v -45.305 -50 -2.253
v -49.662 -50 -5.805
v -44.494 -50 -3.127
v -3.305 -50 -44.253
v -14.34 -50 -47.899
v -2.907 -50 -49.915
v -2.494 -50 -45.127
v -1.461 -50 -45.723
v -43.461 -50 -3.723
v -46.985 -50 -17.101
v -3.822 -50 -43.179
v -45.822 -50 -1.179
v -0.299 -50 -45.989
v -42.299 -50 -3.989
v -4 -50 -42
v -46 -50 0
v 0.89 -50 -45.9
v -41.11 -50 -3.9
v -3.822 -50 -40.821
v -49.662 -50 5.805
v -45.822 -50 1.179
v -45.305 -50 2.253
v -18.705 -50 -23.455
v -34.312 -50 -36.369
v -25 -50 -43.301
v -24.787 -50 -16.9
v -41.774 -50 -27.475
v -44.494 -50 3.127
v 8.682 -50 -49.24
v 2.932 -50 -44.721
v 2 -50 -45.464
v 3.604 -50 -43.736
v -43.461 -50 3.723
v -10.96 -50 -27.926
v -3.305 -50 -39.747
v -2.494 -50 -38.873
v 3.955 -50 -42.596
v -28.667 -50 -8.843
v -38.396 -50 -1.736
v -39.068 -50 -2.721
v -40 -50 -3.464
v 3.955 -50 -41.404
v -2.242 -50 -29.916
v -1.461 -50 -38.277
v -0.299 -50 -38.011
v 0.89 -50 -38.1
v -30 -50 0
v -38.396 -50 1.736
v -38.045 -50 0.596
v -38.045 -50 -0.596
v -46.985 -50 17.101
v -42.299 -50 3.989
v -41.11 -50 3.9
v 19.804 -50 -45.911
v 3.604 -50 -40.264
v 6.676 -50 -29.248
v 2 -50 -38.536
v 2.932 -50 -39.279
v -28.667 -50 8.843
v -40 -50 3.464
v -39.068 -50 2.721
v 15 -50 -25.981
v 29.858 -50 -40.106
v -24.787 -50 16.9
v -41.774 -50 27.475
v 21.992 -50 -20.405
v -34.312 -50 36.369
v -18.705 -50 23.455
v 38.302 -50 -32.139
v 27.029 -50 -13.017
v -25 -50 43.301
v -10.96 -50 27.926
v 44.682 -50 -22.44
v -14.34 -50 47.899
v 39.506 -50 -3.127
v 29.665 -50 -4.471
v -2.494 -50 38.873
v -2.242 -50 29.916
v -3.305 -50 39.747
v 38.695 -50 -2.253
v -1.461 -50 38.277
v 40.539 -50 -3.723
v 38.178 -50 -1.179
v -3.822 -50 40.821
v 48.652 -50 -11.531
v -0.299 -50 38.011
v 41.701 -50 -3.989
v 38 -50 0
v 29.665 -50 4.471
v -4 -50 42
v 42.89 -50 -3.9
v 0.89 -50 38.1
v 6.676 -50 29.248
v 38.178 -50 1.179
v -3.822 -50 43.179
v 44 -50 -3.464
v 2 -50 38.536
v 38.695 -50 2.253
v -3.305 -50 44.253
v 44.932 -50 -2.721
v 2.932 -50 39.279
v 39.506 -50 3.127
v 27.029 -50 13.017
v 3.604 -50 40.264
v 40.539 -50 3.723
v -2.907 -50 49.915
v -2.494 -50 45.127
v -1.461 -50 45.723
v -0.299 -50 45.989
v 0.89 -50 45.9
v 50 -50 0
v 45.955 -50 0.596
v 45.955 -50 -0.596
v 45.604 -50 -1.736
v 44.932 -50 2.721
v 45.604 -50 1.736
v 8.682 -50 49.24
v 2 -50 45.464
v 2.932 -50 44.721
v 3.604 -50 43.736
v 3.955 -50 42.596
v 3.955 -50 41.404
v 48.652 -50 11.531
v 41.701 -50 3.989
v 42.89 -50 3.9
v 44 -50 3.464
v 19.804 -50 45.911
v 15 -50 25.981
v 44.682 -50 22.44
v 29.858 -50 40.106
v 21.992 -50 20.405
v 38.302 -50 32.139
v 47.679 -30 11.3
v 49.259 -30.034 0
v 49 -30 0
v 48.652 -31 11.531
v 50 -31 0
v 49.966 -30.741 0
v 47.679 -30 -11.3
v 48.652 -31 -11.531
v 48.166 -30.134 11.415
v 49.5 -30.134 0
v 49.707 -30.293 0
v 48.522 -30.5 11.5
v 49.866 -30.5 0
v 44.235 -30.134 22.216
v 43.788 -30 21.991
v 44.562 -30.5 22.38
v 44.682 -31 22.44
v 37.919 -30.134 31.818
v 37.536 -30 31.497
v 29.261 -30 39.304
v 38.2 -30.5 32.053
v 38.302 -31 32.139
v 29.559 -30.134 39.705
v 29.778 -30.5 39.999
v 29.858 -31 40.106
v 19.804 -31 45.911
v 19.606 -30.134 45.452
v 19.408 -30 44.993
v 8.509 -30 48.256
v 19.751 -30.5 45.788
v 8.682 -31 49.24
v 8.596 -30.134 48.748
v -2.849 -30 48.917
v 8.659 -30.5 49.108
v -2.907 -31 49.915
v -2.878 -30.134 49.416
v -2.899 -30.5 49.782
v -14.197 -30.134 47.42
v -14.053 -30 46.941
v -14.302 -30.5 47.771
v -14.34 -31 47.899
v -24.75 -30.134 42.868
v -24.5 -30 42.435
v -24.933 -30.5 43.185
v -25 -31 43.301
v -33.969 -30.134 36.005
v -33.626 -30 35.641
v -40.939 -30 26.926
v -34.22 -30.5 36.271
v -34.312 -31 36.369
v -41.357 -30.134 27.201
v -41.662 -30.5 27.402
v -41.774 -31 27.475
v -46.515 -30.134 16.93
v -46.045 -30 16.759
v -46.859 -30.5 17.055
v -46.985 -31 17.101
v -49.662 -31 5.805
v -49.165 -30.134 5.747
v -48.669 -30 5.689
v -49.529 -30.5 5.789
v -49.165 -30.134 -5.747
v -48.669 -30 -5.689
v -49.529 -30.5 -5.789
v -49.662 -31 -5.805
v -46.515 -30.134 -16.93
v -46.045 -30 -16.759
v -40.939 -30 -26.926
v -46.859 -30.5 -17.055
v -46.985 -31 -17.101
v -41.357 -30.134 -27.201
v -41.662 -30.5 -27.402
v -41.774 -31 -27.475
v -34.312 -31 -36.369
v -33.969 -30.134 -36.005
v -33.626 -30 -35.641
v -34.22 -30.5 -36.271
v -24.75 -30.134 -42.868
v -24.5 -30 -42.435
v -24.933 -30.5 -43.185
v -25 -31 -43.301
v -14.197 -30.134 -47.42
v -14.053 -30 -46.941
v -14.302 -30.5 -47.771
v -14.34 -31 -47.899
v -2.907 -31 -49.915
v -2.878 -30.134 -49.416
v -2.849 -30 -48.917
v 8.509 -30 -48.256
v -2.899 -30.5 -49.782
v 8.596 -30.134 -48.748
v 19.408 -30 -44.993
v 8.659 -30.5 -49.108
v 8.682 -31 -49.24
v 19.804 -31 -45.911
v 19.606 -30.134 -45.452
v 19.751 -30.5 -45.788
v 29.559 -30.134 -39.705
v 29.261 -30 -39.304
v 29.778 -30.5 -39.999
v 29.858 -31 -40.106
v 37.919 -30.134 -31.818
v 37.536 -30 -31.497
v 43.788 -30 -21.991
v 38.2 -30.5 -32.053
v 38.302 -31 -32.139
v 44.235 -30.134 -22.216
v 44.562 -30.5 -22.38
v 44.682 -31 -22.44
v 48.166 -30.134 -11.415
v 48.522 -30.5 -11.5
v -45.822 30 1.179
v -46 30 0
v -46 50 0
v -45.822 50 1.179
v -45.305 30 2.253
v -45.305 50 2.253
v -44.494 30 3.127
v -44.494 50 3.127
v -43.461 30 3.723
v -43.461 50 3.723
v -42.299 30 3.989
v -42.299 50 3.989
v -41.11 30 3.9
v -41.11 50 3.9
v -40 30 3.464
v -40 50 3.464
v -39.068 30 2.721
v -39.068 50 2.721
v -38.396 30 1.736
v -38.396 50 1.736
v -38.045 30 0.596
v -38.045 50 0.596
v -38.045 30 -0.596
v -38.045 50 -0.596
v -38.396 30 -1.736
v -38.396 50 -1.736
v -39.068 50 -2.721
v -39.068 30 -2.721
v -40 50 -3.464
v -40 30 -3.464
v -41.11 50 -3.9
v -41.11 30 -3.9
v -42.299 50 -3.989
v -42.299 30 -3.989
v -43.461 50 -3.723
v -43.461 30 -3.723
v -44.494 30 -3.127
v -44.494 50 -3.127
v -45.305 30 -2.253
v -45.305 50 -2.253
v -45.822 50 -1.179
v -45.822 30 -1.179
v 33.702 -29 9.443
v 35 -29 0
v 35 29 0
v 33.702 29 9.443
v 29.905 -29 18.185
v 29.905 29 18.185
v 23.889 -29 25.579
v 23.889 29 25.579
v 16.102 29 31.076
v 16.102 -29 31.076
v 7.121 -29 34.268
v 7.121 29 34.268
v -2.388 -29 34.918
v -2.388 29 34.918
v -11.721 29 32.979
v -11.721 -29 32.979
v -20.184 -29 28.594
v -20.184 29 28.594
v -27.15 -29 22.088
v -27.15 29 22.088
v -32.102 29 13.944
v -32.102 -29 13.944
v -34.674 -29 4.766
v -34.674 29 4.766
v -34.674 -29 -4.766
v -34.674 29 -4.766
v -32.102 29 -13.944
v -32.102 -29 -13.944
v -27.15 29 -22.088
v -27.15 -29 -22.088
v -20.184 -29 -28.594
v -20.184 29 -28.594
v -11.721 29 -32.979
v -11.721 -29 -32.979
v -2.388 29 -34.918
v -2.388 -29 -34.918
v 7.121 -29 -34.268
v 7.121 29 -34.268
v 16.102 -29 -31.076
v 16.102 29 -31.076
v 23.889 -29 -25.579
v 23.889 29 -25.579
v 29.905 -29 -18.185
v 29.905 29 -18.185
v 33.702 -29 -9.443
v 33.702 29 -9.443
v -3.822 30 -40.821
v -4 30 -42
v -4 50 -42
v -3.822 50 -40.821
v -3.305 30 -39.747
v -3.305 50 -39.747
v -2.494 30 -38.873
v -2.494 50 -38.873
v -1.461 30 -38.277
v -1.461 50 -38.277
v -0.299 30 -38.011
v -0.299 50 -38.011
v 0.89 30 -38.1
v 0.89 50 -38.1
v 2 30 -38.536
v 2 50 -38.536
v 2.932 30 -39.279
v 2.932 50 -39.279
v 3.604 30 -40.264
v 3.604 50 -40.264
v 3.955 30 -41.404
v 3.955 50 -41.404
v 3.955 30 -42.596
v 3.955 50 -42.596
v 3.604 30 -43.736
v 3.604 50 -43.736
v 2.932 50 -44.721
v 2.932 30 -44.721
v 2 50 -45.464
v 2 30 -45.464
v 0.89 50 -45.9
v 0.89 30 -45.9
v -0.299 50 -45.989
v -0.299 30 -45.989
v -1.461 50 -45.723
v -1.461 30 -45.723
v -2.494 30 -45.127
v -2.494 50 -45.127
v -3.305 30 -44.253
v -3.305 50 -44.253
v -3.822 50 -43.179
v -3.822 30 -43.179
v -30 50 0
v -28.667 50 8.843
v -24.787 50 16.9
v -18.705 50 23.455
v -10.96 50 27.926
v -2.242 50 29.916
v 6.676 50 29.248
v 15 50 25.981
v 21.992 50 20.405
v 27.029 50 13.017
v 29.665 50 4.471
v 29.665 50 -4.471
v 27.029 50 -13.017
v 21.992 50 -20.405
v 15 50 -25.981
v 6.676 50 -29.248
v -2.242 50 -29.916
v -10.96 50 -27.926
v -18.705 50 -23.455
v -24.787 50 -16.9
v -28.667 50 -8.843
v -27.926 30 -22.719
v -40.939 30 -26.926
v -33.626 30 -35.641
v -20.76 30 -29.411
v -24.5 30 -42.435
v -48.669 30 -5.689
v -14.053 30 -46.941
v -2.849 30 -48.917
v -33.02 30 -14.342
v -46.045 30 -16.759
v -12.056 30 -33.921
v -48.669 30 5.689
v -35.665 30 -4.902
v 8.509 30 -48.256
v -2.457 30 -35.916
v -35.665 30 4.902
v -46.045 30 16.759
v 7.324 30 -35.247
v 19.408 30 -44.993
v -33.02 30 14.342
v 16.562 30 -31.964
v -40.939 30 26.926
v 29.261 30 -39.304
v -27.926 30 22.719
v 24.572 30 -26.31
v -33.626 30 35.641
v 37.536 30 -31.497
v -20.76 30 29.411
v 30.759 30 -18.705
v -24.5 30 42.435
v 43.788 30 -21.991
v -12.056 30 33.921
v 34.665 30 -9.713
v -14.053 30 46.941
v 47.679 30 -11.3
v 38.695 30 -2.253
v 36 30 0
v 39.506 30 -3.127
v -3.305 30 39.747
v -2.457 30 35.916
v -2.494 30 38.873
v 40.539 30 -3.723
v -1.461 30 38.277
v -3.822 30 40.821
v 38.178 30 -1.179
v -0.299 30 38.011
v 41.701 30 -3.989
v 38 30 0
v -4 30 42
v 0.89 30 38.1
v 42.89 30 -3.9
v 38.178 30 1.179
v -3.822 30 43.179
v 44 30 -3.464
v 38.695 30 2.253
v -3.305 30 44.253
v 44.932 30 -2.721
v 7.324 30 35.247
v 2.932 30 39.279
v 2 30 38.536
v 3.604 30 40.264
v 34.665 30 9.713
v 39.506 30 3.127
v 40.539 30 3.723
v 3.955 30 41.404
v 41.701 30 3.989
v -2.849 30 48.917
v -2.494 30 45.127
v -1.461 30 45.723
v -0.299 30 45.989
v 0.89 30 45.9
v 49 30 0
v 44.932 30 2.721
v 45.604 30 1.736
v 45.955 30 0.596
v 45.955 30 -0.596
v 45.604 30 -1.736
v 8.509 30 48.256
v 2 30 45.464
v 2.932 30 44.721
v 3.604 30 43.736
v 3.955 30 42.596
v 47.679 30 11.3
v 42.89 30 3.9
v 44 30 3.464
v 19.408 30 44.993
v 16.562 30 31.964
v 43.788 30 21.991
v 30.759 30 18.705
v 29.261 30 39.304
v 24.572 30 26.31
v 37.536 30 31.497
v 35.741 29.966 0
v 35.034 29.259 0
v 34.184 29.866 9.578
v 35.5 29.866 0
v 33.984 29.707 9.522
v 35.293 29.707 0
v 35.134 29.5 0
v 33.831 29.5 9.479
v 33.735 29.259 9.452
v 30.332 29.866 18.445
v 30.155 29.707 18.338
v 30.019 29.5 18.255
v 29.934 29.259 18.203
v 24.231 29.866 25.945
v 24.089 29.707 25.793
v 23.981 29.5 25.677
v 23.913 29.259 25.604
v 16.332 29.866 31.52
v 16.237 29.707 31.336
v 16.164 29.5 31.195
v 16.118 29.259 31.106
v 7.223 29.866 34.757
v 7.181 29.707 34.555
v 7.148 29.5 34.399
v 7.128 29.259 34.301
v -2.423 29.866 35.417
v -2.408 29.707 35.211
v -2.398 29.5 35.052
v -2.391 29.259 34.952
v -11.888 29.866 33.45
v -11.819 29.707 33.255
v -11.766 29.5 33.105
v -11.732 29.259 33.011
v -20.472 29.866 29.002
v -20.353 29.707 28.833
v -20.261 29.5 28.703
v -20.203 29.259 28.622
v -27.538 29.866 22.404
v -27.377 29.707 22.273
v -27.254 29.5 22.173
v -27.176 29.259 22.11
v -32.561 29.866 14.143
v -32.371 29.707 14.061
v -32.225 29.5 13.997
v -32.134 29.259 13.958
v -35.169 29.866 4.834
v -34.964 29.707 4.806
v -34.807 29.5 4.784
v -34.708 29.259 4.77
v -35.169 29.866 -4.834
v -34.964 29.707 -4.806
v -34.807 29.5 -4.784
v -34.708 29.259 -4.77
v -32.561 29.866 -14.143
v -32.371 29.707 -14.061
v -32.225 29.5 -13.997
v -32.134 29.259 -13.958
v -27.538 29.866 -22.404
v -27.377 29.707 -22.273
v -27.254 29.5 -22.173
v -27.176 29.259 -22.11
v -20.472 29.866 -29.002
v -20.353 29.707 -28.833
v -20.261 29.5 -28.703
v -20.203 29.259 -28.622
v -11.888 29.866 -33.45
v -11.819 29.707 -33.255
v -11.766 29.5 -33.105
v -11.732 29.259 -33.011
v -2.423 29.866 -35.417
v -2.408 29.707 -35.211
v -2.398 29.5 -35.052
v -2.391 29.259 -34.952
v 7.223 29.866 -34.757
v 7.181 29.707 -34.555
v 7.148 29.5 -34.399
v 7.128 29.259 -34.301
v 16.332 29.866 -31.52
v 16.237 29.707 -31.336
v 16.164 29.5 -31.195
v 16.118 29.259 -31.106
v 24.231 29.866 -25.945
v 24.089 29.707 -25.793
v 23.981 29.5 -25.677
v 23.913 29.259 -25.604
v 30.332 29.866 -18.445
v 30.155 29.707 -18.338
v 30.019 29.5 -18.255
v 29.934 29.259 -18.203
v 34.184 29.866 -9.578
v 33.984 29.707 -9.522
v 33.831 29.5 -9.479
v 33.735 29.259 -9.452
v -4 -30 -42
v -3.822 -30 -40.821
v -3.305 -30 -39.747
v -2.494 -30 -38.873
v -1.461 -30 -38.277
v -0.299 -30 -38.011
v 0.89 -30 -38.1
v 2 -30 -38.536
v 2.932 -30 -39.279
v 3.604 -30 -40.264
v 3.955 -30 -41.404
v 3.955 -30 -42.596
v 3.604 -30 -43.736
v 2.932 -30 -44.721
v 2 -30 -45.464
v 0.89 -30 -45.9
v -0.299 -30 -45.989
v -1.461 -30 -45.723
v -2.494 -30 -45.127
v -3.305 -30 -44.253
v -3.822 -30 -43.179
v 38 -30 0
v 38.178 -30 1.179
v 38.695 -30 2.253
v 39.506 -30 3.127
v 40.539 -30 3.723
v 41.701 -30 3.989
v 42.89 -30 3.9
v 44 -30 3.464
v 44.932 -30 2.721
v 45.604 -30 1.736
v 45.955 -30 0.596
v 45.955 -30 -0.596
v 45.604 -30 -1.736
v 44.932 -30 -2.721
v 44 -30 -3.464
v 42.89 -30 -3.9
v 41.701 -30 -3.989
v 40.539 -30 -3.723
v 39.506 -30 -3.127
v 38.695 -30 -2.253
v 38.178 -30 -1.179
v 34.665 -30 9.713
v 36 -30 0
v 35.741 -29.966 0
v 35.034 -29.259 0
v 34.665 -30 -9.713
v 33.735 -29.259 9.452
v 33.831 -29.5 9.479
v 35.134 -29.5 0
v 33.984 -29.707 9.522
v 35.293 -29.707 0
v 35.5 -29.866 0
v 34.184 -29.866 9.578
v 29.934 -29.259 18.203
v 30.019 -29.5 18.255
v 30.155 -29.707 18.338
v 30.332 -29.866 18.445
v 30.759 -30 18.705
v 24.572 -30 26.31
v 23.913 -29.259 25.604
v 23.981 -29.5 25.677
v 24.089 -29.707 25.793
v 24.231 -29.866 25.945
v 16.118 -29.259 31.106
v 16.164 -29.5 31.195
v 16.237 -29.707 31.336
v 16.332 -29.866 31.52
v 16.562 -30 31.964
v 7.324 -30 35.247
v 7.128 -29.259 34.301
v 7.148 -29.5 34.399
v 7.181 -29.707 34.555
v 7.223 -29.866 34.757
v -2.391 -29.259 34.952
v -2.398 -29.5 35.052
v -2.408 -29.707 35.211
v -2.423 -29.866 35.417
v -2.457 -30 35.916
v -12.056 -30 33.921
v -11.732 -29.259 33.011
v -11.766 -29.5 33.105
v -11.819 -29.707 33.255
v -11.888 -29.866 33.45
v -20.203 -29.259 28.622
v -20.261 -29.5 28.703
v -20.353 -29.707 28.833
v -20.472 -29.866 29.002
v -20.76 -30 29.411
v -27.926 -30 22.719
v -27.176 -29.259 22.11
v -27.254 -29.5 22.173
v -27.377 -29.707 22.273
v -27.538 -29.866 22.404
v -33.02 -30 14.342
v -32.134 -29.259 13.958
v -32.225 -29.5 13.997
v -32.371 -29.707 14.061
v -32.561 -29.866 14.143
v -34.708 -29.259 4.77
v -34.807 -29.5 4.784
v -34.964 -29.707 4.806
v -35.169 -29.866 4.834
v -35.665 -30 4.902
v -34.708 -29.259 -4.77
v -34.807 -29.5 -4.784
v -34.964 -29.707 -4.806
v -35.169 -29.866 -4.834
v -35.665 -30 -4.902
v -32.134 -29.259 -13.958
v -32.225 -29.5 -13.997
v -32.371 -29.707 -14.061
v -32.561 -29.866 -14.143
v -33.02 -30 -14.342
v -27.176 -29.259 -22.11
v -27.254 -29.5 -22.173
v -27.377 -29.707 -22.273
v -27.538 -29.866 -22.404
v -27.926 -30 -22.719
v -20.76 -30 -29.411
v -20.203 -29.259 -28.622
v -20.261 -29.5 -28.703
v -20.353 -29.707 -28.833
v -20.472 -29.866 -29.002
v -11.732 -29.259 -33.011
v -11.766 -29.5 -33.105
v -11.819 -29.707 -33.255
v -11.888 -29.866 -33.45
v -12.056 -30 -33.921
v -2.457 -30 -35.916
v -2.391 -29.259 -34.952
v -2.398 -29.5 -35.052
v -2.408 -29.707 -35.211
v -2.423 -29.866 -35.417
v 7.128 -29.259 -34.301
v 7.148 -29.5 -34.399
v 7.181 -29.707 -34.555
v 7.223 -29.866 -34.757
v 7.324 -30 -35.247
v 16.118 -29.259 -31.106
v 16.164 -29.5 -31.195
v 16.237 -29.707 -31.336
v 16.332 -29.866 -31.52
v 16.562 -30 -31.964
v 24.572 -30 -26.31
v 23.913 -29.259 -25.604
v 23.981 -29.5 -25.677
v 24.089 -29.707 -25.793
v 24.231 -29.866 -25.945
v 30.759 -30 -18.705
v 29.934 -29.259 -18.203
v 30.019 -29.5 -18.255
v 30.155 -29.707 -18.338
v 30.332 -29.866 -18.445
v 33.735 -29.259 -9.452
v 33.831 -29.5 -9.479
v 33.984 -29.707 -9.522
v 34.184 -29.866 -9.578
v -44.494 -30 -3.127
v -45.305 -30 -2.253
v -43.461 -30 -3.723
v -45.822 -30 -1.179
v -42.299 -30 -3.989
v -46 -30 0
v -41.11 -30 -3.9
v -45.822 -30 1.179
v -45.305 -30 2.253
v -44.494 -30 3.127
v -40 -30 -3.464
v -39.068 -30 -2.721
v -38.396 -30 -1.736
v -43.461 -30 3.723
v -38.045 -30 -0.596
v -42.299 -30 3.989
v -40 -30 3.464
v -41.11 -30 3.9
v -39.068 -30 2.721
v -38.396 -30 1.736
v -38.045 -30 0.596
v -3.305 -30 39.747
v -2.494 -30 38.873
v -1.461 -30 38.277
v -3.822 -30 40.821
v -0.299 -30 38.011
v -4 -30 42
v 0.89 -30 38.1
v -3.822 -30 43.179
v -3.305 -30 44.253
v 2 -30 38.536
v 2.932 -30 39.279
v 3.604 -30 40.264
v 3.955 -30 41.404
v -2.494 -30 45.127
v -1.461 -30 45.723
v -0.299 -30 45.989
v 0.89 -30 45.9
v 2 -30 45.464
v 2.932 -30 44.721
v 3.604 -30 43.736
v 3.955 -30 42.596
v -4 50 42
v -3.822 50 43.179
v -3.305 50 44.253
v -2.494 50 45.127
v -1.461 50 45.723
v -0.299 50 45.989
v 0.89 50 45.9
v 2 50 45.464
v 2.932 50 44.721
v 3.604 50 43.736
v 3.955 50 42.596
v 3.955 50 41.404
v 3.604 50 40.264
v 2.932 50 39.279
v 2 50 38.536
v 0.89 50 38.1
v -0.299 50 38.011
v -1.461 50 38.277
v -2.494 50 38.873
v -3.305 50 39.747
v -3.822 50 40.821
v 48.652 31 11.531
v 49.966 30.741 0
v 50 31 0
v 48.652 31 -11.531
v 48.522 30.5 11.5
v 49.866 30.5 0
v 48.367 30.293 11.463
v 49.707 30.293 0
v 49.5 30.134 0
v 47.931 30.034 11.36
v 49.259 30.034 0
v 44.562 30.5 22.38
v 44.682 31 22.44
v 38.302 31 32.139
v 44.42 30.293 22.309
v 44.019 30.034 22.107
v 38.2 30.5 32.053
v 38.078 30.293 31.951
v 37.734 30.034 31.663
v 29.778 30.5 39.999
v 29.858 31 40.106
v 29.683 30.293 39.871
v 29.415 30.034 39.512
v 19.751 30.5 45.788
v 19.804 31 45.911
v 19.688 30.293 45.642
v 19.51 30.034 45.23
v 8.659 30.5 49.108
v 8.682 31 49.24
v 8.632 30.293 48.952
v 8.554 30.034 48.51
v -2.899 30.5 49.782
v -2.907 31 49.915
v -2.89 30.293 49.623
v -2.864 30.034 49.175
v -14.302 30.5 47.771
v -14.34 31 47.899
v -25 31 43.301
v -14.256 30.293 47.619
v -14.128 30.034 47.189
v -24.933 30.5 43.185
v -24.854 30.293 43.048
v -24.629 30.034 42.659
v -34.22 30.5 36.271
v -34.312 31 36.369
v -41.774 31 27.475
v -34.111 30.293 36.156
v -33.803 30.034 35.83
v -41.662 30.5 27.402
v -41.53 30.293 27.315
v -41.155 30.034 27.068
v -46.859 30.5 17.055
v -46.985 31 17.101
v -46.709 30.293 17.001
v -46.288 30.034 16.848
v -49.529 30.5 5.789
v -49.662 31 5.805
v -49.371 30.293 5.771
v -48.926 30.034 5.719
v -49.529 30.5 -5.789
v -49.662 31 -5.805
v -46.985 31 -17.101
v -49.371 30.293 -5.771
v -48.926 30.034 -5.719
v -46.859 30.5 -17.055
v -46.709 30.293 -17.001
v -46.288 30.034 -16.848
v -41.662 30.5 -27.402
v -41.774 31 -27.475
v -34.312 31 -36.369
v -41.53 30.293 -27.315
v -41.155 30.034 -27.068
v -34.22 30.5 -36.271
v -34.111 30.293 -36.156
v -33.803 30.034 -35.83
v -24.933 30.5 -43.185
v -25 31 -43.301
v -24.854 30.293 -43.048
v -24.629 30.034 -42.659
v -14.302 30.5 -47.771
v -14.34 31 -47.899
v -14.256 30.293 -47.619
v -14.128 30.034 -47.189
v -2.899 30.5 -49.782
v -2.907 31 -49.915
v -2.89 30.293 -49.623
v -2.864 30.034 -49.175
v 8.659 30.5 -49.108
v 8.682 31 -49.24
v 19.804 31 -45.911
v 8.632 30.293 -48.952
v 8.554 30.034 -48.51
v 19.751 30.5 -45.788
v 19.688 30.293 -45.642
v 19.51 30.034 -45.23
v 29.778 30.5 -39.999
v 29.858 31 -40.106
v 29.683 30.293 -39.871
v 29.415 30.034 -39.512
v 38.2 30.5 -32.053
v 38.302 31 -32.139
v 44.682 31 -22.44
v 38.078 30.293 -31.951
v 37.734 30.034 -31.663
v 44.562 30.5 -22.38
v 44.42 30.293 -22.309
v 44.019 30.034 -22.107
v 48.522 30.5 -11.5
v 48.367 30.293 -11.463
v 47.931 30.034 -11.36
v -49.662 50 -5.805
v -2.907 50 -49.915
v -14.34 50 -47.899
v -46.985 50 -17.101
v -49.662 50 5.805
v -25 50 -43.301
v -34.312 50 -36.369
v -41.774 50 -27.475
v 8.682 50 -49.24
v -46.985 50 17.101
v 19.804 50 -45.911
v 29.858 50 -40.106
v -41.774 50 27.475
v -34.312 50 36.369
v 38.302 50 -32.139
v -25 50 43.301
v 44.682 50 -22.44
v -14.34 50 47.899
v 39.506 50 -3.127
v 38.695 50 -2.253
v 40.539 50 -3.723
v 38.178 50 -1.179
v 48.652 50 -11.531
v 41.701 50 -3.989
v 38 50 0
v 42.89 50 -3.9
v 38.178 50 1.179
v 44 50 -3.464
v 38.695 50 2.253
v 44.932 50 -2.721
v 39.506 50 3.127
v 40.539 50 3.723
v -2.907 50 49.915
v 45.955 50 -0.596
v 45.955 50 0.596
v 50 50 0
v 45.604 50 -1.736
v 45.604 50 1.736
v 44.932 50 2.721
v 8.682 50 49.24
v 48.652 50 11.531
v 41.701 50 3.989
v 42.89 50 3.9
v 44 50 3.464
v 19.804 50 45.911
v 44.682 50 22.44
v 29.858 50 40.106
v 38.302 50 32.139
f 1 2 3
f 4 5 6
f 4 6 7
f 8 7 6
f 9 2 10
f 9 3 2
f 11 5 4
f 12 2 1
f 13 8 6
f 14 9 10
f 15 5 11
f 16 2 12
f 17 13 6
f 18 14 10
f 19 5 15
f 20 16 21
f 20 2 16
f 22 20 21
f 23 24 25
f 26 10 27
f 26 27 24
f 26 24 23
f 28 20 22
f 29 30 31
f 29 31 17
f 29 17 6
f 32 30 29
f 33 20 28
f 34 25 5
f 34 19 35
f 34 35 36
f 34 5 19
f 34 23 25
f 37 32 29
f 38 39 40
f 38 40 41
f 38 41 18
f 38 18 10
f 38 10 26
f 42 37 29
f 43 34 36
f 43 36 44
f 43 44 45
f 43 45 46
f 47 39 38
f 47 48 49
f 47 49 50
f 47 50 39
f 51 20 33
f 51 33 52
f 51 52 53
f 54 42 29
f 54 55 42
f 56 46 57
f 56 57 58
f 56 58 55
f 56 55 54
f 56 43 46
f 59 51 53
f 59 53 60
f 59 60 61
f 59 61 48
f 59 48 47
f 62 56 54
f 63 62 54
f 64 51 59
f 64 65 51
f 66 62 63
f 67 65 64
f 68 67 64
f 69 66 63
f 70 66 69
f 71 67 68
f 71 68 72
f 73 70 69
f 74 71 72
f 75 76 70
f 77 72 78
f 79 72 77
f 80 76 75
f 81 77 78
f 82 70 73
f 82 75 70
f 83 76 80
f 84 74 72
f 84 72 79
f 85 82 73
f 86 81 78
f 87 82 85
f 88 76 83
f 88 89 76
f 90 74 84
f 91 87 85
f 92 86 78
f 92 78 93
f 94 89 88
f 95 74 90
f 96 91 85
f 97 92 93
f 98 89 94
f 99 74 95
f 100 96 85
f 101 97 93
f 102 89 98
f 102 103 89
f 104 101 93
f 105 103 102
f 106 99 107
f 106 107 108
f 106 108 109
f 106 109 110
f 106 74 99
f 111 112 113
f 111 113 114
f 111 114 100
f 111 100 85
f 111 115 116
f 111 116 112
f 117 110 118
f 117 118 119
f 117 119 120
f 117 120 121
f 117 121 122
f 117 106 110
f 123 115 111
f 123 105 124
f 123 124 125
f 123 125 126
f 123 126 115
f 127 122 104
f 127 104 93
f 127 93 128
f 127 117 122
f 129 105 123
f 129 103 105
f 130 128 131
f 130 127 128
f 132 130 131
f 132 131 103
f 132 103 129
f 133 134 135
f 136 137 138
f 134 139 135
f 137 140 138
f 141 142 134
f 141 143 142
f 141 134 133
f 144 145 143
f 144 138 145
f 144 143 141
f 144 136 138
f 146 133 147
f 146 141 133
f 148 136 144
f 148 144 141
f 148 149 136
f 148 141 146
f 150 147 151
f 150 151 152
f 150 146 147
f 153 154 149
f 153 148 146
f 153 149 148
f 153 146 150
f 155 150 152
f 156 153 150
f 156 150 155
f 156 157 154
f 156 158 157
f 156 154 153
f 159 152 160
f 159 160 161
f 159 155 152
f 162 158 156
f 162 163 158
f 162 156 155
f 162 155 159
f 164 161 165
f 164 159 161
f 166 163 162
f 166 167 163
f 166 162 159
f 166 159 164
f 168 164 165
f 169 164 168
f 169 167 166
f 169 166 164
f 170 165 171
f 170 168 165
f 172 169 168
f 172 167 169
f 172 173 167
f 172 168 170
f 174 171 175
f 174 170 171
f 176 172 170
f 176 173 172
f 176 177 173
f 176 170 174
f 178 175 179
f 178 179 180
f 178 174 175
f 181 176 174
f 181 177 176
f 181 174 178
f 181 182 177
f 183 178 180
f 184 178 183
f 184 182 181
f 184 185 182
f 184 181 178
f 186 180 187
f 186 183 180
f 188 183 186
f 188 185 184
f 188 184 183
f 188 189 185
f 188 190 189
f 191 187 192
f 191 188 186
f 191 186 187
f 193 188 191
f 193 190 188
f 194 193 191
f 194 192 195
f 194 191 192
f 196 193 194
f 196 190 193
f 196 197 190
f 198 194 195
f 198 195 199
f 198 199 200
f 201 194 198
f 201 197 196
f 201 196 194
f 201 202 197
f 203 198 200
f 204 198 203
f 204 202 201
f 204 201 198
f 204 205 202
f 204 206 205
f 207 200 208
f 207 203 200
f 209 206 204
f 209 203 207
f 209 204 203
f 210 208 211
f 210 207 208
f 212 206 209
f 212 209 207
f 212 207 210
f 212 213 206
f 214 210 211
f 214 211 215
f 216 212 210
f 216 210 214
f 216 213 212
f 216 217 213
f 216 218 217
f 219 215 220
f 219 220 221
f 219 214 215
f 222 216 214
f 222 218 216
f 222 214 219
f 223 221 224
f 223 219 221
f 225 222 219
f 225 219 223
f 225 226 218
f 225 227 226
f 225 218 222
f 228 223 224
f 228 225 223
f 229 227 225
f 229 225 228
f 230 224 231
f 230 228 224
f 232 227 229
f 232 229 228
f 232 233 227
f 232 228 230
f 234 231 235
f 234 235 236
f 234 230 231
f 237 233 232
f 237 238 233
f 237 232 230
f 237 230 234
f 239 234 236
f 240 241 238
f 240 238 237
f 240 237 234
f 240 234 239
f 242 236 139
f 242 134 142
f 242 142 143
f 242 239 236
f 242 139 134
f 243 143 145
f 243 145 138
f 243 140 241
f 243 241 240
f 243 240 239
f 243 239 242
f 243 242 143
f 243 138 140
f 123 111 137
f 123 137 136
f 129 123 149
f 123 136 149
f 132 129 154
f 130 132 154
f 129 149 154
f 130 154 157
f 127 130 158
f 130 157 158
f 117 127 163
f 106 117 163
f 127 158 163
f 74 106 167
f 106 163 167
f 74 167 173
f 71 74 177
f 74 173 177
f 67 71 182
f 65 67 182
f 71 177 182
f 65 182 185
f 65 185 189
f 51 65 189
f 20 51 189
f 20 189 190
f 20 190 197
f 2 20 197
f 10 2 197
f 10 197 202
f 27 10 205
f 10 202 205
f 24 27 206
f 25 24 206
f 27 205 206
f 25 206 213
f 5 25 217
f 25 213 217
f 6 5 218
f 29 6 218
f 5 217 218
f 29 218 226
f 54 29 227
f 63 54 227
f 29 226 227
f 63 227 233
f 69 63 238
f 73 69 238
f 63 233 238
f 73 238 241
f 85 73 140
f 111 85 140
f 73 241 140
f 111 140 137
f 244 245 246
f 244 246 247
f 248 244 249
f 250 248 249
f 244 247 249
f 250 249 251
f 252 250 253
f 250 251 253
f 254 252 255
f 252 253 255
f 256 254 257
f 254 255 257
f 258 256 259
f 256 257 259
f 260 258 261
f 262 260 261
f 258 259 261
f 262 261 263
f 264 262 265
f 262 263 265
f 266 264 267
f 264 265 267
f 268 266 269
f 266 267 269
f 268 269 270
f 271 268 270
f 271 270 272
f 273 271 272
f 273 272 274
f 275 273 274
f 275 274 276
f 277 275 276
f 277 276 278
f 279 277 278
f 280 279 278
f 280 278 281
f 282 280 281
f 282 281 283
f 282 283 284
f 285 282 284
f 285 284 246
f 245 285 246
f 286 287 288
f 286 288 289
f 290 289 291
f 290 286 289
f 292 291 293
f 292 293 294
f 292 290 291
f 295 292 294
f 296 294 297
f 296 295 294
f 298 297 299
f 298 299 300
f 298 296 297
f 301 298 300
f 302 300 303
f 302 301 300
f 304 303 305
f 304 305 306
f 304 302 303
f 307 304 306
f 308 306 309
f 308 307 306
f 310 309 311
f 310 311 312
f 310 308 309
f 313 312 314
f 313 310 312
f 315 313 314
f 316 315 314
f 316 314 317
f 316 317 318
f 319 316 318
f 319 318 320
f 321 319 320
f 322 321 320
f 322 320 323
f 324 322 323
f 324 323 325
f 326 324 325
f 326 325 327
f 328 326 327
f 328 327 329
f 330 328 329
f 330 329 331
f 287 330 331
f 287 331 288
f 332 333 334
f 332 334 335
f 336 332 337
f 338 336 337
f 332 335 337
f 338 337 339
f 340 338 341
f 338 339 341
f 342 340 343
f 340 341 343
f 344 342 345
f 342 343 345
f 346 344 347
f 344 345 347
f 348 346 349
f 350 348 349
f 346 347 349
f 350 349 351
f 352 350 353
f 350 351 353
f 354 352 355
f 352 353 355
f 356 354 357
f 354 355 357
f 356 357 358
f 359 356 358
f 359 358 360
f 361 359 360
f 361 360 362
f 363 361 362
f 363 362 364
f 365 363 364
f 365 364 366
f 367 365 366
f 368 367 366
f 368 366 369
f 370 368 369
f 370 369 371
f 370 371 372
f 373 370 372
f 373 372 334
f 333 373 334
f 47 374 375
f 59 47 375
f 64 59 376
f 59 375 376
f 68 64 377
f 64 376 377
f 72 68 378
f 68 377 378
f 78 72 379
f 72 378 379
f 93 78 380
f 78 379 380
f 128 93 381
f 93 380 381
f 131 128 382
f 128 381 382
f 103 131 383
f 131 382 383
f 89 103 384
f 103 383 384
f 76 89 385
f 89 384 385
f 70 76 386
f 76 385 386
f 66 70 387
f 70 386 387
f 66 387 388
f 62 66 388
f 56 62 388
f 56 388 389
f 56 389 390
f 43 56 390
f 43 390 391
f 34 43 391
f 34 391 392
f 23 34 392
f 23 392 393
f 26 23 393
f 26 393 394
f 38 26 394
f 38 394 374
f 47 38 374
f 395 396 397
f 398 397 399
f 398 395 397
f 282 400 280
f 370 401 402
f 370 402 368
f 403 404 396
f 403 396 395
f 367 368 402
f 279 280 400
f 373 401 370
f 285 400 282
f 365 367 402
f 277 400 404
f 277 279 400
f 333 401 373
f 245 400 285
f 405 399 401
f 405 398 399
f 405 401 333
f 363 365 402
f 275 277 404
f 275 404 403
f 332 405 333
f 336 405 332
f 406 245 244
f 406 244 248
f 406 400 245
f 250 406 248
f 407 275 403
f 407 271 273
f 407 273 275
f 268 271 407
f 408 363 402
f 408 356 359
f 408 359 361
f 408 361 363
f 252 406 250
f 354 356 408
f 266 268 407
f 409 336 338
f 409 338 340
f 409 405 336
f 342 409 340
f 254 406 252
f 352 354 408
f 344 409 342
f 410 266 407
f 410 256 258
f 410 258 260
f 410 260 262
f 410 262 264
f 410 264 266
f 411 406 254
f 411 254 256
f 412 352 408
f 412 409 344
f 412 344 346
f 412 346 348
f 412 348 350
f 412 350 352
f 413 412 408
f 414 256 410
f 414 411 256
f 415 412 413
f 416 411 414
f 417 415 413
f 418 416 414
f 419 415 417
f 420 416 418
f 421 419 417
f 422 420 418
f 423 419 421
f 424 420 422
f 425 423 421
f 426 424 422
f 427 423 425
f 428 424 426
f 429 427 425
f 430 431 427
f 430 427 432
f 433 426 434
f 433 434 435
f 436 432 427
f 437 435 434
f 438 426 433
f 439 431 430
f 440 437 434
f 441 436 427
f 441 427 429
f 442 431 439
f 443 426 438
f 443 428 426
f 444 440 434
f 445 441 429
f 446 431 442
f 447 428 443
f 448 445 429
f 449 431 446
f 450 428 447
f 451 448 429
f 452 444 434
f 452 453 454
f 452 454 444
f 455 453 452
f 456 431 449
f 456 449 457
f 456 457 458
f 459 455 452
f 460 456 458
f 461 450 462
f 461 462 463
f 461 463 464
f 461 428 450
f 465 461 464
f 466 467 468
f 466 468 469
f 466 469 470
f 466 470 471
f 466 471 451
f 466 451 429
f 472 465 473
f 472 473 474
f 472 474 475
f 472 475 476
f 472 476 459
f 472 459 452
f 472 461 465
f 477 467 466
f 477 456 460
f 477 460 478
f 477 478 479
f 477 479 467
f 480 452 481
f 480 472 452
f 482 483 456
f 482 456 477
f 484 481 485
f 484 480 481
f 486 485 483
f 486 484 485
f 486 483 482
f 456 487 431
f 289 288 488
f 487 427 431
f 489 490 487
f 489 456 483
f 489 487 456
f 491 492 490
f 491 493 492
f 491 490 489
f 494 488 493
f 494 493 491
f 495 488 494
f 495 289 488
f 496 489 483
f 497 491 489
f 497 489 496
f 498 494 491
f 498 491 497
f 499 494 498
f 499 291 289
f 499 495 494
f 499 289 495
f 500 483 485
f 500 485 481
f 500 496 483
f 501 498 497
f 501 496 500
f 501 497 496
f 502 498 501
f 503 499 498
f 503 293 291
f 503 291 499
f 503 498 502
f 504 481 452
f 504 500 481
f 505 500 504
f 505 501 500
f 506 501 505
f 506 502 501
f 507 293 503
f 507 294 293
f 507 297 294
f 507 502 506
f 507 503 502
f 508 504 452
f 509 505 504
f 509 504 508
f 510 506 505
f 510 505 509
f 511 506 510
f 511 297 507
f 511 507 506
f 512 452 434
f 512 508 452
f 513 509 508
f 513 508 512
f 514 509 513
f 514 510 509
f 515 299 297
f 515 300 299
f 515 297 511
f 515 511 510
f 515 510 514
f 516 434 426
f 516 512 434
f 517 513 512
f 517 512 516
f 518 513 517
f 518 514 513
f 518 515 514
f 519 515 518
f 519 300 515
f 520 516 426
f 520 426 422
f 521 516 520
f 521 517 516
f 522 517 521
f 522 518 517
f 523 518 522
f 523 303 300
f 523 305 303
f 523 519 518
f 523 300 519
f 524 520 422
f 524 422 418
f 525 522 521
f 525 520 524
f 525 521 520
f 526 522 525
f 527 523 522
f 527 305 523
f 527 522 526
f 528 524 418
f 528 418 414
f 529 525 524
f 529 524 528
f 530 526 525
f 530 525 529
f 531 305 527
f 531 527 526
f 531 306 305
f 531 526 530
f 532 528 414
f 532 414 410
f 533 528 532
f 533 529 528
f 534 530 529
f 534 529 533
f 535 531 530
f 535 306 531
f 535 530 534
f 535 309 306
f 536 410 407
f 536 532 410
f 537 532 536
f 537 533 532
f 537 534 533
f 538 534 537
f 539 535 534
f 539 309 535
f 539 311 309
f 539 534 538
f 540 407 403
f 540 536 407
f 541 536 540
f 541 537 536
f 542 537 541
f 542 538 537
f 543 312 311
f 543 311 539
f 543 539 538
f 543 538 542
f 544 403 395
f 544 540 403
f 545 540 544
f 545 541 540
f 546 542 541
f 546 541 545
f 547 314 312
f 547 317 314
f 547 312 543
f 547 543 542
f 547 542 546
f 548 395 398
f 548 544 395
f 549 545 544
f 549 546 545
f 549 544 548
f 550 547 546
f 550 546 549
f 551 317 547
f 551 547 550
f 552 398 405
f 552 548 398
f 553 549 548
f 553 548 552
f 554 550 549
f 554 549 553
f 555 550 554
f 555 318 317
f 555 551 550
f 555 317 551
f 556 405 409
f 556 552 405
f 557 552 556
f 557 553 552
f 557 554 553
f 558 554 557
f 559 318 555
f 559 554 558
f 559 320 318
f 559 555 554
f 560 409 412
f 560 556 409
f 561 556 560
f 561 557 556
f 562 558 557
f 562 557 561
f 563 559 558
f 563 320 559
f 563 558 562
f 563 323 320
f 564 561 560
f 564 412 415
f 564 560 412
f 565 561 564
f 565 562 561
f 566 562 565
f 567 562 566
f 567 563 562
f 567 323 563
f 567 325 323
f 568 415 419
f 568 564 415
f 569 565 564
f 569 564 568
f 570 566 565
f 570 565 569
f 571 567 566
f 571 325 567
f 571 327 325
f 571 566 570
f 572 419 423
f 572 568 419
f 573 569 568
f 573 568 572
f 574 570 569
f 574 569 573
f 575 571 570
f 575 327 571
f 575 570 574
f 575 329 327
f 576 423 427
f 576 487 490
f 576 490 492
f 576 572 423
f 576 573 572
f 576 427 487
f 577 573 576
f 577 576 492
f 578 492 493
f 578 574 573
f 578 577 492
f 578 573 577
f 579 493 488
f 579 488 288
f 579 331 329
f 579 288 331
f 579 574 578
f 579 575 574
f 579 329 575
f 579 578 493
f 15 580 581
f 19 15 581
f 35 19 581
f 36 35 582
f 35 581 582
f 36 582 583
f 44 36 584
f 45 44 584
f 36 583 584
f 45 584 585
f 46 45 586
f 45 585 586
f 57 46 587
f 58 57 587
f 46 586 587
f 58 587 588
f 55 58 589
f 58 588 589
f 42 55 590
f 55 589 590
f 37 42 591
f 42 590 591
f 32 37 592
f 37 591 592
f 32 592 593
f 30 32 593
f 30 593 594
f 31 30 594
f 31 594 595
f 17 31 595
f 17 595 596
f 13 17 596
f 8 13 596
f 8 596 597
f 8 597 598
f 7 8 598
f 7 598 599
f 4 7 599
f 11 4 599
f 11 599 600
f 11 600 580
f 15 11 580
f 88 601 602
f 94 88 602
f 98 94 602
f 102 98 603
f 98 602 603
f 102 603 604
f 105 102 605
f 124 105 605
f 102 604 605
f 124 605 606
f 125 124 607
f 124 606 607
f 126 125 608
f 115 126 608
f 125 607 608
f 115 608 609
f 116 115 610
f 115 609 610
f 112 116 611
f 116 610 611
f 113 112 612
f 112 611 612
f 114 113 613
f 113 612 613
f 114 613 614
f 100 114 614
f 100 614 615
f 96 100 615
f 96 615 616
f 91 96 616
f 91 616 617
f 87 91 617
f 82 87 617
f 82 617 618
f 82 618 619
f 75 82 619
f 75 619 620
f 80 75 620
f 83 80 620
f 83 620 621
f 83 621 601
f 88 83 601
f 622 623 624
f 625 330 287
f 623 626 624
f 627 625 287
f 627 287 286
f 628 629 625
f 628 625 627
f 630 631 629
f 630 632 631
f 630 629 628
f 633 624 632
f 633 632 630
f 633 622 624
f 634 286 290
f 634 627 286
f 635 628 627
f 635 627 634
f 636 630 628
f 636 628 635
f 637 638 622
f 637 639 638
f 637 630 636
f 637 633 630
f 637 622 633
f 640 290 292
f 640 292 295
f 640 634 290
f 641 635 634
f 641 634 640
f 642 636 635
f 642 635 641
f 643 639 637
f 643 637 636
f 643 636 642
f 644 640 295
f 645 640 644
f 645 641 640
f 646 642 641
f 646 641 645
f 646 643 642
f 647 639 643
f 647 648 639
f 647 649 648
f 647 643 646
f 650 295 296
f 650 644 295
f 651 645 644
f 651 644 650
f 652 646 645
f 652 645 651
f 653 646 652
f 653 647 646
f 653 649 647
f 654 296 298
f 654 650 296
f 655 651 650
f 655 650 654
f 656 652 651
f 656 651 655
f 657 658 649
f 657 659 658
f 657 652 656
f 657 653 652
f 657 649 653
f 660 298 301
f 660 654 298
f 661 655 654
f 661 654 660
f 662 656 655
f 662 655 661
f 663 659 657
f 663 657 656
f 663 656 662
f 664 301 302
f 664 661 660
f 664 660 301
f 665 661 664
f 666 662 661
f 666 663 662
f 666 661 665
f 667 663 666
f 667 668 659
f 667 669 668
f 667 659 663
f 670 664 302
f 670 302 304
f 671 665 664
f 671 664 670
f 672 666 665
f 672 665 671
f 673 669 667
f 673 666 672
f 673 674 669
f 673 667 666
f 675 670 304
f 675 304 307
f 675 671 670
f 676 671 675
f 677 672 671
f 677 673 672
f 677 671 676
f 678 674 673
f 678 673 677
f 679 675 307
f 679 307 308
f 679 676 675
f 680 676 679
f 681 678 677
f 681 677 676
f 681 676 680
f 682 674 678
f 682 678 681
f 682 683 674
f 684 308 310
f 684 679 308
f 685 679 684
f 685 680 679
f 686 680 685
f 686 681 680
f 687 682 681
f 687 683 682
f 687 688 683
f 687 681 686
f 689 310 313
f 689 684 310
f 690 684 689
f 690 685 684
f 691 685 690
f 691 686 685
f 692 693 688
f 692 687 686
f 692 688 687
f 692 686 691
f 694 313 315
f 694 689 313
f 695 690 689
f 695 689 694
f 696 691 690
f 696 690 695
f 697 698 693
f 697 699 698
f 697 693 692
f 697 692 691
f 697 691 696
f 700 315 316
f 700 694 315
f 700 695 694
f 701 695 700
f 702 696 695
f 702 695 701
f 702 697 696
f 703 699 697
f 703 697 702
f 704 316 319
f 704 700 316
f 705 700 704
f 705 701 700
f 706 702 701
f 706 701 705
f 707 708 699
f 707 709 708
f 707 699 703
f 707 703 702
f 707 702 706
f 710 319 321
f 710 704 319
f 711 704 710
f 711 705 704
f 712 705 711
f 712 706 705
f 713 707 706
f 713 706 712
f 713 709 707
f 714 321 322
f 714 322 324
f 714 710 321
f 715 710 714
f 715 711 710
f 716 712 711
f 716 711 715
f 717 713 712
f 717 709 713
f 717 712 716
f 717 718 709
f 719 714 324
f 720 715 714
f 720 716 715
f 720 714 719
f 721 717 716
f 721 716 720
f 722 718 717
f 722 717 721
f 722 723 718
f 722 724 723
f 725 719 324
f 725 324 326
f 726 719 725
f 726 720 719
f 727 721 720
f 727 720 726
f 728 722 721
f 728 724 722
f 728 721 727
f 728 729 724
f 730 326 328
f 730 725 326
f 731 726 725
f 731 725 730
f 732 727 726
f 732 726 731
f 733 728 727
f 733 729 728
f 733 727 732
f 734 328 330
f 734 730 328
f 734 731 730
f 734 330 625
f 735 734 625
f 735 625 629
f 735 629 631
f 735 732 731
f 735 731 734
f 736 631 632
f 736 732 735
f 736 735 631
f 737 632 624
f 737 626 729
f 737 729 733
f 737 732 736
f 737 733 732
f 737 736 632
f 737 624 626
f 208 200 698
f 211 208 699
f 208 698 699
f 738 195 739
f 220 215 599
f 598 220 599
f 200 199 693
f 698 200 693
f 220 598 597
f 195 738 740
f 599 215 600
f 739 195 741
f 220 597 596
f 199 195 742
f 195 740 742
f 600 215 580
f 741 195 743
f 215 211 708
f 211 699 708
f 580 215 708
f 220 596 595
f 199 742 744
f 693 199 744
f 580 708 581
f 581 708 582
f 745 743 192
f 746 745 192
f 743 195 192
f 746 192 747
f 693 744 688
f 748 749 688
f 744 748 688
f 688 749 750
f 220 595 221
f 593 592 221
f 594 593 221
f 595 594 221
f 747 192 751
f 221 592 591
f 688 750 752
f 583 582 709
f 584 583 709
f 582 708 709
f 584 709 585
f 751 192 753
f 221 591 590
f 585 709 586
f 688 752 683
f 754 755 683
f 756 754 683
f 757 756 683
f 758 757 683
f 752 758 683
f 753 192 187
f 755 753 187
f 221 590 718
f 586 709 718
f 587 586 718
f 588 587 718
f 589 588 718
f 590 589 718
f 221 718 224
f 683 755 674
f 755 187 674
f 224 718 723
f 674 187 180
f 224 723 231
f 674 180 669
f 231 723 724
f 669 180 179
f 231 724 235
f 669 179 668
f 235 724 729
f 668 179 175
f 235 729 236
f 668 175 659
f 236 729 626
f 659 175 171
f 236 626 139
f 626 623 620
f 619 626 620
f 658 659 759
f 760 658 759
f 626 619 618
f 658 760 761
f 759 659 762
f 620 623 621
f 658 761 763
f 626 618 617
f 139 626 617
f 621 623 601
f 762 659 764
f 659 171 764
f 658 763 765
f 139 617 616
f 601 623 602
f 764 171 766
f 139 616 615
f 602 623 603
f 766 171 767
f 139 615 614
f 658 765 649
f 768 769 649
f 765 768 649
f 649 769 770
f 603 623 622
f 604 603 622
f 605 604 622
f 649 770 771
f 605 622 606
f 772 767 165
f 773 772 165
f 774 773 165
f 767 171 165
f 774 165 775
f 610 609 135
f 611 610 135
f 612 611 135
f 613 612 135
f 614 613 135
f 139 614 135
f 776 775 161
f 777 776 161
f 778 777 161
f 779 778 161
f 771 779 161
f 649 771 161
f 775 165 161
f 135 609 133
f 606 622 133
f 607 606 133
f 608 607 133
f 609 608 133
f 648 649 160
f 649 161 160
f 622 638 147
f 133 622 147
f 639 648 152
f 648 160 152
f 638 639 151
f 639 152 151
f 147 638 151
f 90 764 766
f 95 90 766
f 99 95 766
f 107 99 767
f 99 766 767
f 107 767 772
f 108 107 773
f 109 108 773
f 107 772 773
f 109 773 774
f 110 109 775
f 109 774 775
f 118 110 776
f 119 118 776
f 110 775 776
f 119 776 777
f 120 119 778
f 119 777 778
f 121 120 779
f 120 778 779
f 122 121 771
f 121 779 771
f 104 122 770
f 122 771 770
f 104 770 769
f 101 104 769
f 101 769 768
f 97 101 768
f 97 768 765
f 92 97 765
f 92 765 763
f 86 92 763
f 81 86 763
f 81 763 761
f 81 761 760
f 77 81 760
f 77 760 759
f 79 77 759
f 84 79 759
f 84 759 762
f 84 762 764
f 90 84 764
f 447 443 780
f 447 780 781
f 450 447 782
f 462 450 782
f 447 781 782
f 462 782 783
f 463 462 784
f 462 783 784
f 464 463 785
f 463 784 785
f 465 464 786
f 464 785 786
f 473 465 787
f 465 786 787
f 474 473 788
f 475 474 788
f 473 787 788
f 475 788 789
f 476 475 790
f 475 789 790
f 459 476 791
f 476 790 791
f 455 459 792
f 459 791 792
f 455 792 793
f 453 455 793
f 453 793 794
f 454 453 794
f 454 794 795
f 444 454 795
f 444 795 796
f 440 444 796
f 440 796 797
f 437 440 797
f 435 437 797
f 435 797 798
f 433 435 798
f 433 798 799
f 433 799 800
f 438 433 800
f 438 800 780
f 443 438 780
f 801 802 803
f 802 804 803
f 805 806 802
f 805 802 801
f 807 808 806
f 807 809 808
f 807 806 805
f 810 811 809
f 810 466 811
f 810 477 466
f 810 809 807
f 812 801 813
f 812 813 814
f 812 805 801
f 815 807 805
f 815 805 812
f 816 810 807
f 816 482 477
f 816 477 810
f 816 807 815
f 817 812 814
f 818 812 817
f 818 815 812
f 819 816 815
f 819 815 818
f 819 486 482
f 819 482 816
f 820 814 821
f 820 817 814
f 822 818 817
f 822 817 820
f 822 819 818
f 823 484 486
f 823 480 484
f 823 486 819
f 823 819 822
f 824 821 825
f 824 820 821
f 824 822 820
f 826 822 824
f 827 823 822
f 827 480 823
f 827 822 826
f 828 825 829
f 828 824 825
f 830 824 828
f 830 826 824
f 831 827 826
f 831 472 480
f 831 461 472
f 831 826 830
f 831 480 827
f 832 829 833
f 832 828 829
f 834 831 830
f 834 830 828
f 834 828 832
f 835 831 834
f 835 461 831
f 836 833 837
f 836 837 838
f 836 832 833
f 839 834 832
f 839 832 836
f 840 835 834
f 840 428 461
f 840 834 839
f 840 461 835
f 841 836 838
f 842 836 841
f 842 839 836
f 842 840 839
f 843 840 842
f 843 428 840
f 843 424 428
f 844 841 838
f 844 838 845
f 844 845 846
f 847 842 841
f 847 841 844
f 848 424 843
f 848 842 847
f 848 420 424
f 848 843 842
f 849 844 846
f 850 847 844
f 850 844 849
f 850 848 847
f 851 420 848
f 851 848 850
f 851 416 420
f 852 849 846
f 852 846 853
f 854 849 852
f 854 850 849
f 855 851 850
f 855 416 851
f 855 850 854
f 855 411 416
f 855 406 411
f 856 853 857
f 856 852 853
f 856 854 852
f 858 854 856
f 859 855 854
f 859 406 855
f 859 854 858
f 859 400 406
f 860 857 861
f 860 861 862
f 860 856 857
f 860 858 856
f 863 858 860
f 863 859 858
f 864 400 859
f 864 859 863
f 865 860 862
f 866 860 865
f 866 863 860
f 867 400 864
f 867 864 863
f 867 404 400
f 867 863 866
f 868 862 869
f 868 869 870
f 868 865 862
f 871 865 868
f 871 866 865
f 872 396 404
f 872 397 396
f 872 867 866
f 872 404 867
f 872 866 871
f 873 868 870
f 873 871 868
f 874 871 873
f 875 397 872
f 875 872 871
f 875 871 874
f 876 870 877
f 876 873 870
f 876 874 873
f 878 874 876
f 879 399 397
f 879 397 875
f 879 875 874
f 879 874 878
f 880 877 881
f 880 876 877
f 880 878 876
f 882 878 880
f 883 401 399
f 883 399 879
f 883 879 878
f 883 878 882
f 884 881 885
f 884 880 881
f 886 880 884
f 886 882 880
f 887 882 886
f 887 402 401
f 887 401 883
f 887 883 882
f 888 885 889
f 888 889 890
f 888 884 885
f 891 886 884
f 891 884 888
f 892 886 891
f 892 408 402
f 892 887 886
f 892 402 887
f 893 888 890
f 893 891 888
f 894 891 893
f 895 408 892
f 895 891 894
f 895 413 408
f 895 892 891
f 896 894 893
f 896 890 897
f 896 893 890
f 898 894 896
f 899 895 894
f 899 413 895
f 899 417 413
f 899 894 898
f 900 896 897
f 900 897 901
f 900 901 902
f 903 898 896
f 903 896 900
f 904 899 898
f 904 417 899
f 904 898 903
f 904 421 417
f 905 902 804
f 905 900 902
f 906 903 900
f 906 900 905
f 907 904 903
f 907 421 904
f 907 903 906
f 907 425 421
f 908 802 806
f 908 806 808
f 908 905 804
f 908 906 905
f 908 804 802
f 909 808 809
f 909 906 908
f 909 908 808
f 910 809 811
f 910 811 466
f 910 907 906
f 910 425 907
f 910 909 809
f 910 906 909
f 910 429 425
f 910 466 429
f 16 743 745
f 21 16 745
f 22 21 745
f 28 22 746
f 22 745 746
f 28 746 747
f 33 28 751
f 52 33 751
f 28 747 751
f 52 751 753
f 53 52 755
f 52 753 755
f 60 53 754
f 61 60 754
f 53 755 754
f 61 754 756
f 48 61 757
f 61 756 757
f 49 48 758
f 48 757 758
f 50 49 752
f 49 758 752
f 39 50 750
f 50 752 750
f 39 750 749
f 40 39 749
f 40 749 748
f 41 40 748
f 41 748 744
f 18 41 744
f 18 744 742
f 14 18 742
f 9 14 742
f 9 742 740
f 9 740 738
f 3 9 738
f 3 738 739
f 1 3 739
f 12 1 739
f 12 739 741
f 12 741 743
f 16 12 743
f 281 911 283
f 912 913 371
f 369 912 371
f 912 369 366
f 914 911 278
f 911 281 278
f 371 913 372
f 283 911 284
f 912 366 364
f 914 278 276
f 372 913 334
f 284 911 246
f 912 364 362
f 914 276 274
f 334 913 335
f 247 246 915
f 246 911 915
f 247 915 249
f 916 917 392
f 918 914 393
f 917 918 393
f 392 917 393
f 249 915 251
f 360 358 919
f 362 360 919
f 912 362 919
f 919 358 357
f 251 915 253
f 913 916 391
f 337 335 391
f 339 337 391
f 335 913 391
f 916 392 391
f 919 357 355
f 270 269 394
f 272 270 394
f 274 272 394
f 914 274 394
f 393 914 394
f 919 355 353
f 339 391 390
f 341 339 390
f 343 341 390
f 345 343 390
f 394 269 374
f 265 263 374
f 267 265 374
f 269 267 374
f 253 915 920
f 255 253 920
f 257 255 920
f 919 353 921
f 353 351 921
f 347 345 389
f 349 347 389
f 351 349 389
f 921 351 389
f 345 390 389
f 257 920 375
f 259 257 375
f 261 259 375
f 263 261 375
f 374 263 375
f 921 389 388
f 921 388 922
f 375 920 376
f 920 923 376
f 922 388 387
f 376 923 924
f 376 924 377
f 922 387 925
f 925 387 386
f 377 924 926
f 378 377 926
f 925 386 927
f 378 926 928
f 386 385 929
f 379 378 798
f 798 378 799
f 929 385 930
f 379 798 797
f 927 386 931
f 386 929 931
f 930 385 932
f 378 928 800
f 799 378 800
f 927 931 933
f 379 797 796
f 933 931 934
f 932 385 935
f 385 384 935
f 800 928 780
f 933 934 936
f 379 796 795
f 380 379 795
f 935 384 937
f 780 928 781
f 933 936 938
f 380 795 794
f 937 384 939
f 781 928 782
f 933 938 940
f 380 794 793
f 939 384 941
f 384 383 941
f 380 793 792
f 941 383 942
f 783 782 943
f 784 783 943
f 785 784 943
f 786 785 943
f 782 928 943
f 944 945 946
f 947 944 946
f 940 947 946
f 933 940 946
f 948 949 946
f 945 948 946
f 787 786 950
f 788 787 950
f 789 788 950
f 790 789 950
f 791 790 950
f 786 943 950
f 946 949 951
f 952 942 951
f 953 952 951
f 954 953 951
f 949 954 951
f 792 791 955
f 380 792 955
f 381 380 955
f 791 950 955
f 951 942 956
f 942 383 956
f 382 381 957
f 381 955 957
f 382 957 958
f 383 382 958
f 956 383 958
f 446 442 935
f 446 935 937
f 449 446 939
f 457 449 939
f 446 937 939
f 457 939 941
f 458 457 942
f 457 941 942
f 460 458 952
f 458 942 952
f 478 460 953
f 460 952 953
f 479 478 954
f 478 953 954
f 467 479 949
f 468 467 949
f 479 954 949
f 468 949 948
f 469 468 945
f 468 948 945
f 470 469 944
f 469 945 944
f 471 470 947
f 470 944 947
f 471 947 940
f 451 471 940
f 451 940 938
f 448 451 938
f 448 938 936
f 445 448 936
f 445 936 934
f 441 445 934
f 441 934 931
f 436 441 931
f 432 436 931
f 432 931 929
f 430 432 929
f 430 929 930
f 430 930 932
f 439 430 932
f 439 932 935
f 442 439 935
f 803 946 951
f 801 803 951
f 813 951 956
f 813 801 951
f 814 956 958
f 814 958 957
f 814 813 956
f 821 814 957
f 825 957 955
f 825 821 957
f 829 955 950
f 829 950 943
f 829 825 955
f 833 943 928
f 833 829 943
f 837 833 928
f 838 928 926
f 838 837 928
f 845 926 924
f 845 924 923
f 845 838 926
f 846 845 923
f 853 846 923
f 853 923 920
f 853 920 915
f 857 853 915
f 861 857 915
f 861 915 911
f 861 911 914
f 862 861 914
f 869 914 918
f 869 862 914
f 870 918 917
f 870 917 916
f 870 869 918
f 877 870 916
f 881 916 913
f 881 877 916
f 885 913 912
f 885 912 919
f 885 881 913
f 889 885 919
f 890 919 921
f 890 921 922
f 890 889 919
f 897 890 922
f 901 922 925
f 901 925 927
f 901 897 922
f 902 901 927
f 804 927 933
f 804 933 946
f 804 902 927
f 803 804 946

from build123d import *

# Parameters (mm, degrees)
F0_R     = 35
F1_DEPTH = 30
F3_R     = 50
F4_DEPTH = 20
F6_R     = 50
F7_DEPTH = 20
F9_D     = 60
F11_D    = 8
F12_R    = 1


with BuildPart() as f1:
    # F0 (on Front) → F1 (new body, symmetric)
    with BuildSketch(Plane.XZ):
        Circle(F0_R)
    extrude(amount=F1_DEPTH, both=True)

    # F3 (on offset) → F4 (join)
    with BuildSketch(Plane.XZ.offset(30)):
        Circle(F3_R)
    extrude(amount=F4_DEPTH)

    # F6 (on offset) → F7 (join)
    with BuildSketch(Plane.XZ.offset(-30)):
        Circle(F6_R)
    extrude(amount=-F7_DEPTH)

    # F9 (through all)
    with Locations(Plane.XZ.offset(50)):
        with Locations((0, 0)):
            Hole(F9_D / 2)

    # F11 (through all)
    with Locations(Plane.XZ.offset(50)):
        with Locations((0, 42), (-42, 0), (0, -42), (42, 0)):
            Hole(F11_D / 2)

    # F12
    f12_edges = [f1.edges().sort_by_distance(p)[0] for p in [
        (-35, -30, 0),
        (-35, 30, 0),
        (-50, 30, 0),
        (-50, -30, 0),
    ]]
    fillet(f12_edges, radius=F12_R)


solid = f1.part
